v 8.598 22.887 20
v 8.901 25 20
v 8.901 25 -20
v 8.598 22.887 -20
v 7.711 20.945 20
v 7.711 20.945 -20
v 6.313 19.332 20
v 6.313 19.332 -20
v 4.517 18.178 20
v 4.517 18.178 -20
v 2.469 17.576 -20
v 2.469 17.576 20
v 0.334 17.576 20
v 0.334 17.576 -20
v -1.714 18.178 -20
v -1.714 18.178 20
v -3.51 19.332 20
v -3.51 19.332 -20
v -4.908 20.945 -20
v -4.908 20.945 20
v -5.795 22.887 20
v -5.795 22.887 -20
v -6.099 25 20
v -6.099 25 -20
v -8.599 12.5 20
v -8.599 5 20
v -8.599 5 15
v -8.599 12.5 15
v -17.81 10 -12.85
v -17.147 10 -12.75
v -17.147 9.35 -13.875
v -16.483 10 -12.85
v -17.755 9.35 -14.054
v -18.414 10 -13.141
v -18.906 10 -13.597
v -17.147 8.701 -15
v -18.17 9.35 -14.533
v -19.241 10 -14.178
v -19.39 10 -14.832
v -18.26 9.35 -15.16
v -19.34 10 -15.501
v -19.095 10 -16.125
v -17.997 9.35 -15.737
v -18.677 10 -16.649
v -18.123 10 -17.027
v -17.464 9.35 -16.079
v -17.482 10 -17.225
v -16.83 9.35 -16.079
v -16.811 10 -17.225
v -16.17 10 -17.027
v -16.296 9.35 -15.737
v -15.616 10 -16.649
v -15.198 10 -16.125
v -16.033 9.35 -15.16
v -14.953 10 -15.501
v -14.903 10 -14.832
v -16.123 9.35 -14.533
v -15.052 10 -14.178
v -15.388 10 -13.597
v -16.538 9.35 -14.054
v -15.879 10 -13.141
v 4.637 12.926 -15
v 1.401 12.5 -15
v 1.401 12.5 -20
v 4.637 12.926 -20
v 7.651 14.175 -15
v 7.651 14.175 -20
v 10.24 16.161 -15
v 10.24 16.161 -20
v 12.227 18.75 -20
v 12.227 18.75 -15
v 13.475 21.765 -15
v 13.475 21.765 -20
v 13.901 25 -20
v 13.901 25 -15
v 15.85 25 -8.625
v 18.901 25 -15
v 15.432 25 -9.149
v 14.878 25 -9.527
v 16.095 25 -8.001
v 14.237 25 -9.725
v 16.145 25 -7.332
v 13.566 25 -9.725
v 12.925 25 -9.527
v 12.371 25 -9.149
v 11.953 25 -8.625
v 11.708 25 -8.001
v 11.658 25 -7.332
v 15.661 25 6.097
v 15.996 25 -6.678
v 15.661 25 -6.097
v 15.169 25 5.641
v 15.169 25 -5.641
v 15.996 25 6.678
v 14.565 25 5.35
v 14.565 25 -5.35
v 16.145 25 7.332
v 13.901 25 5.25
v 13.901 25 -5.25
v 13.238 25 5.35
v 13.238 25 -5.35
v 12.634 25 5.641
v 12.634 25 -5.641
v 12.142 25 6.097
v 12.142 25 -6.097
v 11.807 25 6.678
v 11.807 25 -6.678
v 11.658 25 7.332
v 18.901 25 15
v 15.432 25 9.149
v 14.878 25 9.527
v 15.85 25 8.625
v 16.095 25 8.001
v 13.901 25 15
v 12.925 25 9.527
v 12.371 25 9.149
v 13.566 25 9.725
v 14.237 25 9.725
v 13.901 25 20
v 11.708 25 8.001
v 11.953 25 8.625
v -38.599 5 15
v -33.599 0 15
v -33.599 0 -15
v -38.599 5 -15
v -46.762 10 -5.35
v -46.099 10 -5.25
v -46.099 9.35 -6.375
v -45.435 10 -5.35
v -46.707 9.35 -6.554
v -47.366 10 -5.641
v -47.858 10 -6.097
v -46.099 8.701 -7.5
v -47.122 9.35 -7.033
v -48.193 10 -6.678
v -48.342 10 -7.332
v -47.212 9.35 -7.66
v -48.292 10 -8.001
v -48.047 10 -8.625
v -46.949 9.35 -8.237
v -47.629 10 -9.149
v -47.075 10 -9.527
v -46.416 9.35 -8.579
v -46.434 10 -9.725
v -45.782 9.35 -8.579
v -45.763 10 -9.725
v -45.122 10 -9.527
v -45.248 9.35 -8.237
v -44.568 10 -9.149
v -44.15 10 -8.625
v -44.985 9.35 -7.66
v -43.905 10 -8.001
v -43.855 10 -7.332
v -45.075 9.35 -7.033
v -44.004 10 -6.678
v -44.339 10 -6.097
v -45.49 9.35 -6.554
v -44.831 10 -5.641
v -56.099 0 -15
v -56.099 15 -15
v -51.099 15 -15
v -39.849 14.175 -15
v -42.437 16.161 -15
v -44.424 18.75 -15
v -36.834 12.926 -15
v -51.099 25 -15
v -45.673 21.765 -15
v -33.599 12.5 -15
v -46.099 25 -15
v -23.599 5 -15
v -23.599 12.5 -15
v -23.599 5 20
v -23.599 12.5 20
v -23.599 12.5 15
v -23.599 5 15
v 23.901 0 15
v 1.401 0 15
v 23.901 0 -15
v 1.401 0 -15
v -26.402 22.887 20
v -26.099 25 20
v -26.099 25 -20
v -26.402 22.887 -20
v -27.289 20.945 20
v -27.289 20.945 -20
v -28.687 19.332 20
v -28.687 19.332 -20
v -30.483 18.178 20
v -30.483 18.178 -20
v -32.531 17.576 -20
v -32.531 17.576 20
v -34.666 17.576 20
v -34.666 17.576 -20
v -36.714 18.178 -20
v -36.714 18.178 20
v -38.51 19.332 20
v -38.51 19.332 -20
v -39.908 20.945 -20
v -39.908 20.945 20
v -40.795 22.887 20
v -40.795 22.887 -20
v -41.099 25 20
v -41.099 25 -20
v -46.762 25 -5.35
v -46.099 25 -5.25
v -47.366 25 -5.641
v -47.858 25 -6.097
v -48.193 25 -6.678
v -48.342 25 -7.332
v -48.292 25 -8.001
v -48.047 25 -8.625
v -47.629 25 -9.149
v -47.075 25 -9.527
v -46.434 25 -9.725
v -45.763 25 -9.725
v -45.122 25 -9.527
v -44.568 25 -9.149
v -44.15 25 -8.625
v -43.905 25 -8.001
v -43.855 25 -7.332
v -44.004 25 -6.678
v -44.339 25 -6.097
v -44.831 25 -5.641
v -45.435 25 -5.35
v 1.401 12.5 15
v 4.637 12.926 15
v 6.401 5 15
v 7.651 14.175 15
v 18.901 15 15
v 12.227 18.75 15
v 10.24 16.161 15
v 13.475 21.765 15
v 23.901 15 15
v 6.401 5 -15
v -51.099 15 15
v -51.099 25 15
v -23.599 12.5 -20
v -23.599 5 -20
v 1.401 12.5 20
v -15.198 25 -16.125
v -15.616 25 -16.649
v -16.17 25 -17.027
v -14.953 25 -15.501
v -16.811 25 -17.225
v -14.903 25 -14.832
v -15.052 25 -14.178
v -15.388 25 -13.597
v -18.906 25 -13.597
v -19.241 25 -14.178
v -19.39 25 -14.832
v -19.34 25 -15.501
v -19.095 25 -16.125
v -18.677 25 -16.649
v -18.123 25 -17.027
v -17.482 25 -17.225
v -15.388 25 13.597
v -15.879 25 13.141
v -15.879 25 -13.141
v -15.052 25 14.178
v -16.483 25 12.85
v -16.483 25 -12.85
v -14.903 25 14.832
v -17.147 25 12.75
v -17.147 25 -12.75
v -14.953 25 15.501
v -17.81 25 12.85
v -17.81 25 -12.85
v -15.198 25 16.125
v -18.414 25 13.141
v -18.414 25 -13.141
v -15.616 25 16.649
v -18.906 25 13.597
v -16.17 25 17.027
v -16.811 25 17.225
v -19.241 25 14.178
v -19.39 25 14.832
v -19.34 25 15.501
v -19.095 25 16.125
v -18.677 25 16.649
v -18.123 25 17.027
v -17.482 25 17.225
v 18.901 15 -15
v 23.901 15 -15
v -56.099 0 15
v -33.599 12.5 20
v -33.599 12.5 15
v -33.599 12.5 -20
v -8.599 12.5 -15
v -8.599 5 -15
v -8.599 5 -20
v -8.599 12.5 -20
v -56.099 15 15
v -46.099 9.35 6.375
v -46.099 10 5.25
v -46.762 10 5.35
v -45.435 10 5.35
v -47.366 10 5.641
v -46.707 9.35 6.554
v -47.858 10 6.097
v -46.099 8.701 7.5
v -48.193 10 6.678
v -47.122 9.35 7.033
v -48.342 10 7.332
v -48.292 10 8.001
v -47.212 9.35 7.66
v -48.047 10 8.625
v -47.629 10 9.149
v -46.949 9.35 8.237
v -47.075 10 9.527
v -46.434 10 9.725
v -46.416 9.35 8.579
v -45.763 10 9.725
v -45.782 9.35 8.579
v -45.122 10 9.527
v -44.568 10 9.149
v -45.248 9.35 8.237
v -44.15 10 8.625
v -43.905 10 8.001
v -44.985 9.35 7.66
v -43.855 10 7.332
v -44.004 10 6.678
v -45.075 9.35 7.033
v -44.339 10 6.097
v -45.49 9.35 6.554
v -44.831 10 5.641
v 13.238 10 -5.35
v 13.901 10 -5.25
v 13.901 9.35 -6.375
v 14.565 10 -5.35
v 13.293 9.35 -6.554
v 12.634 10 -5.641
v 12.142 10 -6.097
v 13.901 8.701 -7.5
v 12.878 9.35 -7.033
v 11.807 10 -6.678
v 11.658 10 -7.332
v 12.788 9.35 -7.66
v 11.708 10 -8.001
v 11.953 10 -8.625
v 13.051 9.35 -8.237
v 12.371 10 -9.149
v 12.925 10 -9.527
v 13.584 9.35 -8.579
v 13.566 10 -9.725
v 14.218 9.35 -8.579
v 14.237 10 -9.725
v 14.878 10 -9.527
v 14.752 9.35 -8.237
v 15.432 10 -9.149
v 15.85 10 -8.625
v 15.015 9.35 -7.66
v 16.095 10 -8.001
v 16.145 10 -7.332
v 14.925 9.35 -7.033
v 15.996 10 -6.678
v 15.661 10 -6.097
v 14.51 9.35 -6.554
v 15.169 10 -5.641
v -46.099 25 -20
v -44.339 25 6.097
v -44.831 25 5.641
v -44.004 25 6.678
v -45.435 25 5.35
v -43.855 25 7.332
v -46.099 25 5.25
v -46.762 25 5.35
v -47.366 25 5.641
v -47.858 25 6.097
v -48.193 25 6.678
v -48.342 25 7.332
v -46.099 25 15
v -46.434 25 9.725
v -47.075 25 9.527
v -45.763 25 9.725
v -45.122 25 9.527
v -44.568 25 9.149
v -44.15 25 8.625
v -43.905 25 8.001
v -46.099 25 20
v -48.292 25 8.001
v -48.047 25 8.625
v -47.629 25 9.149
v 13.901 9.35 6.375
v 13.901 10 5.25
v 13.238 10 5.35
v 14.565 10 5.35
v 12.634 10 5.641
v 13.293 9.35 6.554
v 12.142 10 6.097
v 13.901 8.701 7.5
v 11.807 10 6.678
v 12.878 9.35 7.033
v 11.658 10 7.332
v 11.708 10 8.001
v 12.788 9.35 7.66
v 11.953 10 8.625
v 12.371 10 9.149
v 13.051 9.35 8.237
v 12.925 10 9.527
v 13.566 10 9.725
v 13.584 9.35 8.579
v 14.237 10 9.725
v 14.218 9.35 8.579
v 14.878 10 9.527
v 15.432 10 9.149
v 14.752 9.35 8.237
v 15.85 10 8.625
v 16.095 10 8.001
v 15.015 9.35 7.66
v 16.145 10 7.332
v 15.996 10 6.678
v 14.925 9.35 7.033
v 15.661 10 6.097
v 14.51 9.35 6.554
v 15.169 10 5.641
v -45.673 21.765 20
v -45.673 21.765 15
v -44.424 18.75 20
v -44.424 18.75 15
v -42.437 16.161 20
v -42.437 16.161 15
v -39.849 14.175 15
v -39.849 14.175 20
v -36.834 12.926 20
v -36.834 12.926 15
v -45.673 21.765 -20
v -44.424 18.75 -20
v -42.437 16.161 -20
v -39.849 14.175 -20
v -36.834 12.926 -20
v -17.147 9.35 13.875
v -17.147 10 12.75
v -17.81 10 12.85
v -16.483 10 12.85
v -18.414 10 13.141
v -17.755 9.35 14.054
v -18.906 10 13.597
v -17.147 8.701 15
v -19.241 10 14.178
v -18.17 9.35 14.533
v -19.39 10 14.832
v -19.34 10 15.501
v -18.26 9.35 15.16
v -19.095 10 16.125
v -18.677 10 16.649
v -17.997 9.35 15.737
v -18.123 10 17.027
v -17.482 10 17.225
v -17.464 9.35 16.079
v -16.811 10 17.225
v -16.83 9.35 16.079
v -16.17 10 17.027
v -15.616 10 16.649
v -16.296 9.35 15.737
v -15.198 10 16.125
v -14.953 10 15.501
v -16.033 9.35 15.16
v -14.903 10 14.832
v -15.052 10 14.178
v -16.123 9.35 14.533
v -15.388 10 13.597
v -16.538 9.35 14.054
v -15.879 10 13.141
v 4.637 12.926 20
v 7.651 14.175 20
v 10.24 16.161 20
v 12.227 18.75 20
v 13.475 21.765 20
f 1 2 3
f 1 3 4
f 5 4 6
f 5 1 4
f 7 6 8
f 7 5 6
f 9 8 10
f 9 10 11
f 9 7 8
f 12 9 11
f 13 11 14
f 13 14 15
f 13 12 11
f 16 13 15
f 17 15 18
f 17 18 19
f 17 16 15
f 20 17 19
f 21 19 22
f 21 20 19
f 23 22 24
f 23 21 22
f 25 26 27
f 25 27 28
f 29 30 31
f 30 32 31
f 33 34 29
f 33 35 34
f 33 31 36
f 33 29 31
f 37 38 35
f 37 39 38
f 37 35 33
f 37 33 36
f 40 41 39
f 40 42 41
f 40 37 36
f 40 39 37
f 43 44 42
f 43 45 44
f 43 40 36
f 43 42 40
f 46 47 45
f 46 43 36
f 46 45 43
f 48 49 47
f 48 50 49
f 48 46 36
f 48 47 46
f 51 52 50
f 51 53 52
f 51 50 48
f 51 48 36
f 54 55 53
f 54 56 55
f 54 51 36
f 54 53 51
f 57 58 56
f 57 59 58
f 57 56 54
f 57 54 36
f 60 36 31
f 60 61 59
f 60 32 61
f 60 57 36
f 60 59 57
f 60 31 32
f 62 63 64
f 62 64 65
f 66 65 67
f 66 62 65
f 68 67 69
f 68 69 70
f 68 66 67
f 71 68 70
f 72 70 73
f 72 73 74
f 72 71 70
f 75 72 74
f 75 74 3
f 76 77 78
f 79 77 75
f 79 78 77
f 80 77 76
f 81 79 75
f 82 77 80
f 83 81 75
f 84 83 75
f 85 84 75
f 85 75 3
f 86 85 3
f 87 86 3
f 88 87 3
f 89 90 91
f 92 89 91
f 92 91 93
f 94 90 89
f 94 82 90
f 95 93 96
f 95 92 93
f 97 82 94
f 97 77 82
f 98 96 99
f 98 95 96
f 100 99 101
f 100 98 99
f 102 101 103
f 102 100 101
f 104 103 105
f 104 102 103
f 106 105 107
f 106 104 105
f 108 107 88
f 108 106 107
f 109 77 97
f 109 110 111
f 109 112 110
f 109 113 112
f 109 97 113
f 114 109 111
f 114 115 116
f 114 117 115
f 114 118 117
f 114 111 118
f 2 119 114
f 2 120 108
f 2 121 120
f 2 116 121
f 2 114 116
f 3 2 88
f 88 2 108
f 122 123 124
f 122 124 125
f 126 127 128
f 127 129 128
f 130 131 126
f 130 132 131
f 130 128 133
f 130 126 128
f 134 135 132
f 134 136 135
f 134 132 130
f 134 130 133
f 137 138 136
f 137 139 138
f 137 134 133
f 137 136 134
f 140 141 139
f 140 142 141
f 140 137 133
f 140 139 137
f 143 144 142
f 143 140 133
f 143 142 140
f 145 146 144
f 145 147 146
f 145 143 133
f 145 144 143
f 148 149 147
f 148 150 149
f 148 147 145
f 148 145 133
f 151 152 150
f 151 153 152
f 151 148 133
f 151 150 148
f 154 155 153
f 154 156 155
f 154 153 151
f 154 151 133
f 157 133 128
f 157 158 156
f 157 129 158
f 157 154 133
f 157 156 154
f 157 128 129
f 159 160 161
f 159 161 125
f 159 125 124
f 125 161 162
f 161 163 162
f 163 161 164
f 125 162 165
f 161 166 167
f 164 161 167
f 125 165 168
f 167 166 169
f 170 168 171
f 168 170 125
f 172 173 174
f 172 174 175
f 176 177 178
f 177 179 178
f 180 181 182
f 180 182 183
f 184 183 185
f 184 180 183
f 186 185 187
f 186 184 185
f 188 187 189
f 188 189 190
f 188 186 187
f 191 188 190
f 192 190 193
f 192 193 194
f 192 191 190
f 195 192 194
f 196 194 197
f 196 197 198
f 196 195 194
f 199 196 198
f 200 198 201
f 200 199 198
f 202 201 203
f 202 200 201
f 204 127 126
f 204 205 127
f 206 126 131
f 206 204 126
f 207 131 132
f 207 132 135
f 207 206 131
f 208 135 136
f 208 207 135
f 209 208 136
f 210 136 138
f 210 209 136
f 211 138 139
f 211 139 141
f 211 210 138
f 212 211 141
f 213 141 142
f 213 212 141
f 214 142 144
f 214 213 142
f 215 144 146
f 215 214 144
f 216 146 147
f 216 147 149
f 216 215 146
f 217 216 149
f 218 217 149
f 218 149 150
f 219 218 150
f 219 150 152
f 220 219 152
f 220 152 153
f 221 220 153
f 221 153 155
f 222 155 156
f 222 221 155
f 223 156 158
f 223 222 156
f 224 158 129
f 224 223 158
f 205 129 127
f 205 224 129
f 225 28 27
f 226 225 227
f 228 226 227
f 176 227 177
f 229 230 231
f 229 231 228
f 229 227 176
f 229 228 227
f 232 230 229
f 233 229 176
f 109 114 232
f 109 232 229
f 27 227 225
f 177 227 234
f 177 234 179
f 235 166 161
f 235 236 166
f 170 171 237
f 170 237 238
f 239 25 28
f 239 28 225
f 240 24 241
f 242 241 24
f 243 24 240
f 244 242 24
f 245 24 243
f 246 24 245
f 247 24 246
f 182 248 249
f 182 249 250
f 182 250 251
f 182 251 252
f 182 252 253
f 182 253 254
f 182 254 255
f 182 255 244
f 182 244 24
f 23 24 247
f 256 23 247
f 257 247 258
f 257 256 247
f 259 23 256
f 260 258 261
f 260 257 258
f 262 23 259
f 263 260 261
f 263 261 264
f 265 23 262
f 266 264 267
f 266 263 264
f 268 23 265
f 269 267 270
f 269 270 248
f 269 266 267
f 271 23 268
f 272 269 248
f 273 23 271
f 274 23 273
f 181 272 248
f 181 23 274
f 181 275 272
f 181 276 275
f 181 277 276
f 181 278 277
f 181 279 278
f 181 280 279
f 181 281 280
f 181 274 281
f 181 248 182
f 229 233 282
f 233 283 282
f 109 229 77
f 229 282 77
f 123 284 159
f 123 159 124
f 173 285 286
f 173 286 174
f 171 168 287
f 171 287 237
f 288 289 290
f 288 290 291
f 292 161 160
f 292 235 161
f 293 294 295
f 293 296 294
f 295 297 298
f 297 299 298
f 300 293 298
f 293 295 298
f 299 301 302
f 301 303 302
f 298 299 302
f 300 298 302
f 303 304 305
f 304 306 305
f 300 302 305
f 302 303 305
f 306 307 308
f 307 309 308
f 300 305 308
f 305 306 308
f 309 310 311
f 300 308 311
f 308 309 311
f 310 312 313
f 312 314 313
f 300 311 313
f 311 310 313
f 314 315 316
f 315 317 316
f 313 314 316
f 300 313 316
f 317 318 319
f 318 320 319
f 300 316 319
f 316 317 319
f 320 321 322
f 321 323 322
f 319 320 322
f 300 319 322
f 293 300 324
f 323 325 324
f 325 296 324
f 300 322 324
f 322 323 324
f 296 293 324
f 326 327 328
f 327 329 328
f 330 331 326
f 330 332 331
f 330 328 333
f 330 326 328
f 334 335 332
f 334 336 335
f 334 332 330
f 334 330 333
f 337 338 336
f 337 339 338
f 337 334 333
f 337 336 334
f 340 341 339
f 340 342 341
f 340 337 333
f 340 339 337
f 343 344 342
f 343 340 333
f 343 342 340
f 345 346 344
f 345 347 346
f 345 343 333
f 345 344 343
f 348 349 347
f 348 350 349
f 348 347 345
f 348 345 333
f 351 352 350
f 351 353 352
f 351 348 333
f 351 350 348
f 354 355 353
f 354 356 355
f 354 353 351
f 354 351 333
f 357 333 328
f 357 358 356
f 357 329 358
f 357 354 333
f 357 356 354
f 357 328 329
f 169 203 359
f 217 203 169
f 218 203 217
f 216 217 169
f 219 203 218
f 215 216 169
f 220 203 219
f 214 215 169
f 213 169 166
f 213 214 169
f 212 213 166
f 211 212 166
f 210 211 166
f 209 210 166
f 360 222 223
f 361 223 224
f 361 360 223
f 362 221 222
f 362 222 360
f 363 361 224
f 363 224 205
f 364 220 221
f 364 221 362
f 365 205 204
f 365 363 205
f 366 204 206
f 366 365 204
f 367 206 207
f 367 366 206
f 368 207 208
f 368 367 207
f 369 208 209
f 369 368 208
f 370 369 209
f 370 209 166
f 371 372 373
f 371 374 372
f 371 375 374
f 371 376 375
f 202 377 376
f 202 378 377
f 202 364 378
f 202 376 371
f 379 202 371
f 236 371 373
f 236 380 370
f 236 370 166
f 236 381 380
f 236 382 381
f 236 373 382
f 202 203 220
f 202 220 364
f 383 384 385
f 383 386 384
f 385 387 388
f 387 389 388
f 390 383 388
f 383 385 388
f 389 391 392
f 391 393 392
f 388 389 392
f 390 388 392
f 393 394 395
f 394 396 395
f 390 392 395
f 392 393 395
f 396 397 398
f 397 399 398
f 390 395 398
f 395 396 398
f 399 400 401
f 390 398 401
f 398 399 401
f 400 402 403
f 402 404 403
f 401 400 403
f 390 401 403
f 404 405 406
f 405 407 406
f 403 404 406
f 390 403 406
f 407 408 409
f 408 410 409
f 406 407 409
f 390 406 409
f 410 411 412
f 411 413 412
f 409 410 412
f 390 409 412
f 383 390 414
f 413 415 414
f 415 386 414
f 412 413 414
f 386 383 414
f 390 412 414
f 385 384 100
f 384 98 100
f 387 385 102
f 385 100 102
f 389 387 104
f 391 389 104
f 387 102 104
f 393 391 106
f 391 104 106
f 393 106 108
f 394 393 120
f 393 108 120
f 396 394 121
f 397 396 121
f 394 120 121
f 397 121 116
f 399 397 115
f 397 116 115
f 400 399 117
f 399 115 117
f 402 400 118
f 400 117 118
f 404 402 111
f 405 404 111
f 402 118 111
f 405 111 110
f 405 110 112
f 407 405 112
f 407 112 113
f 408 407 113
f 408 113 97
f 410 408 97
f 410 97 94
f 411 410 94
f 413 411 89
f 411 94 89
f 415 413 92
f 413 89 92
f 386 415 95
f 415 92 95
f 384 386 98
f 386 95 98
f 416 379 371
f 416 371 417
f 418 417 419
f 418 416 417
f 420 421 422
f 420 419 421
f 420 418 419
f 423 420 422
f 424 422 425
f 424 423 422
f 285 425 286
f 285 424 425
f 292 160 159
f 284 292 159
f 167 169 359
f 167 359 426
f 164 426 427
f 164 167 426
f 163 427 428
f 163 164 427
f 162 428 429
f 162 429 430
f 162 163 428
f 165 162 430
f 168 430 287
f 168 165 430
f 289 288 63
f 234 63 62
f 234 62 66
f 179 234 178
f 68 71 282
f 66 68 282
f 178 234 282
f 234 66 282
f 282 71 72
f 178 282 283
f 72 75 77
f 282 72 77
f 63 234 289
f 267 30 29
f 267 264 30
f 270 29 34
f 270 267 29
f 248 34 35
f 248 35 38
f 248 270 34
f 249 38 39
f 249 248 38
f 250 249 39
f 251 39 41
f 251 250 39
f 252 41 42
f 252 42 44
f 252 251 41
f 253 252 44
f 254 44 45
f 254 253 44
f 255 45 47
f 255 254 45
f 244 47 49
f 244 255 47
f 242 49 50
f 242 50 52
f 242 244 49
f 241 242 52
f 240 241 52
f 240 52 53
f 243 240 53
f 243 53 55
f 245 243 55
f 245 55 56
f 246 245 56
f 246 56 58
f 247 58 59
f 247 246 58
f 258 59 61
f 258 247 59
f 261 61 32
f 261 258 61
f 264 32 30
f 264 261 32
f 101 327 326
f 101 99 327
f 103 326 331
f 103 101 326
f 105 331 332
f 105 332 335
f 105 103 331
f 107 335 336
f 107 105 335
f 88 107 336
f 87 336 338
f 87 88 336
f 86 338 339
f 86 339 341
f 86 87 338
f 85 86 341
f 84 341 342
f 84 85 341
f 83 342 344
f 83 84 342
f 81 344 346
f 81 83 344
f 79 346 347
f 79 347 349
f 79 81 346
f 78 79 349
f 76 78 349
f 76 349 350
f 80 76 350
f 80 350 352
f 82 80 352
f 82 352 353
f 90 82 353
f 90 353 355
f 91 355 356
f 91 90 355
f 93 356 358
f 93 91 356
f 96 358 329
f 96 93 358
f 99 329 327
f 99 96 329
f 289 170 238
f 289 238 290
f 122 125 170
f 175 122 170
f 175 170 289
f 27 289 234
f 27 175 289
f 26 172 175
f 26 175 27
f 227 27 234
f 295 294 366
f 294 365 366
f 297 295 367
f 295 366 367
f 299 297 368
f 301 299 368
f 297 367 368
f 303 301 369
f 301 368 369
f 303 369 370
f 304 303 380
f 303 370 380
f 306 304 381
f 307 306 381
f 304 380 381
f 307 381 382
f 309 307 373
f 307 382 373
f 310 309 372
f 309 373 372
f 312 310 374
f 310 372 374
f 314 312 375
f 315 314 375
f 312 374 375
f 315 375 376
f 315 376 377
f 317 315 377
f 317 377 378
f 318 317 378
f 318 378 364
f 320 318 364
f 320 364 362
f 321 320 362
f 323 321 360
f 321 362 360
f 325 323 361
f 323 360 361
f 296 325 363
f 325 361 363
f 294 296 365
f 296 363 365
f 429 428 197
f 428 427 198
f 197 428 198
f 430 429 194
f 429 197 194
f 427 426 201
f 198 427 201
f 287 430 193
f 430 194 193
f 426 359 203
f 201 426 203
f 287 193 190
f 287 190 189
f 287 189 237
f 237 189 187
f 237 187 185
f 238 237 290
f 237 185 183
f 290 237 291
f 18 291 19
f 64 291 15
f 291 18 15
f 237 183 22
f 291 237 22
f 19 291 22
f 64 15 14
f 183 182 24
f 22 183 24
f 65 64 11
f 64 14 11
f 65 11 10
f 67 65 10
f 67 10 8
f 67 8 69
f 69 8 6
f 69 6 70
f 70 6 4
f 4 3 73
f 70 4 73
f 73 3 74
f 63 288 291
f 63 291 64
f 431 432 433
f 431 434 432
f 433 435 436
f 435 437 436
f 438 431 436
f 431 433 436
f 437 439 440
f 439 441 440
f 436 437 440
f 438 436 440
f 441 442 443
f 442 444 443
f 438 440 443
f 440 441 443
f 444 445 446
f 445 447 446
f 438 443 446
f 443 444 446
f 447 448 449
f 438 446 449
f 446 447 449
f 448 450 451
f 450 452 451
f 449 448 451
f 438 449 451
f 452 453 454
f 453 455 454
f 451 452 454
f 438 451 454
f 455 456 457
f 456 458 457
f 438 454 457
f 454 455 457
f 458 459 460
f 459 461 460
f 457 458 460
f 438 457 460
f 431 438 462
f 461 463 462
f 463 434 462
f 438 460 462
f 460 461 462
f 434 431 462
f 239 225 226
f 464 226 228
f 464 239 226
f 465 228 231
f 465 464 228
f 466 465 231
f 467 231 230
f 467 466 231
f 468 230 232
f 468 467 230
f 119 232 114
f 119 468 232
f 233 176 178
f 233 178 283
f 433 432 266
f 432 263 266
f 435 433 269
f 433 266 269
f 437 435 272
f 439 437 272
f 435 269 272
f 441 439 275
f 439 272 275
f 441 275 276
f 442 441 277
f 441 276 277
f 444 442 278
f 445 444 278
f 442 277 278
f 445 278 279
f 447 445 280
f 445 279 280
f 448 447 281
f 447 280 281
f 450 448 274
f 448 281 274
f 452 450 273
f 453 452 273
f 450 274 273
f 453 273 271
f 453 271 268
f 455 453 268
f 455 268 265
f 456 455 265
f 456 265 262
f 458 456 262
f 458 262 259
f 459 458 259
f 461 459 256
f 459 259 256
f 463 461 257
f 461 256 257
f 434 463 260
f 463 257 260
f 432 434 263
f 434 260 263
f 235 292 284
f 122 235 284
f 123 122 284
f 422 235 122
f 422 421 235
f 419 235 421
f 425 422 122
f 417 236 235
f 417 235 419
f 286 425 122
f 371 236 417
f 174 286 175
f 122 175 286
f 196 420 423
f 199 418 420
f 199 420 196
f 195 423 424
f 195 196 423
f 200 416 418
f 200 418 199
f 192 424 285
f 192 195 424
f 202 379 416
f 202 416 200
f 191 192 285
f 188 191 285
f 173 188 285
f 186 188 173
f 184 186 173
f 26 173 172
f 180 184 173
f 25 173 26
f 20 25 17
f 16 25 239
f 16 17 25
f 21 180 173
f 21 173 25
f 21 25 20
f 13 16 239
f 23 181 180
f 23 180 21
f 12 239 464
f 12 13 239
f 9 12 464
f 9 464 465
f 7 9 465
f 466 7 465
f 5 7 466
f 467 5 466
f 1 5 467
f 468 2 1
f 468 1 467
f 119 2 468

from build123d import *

# Parameters (mm, degrees)
BOSS_EXTRUDE1_DEPTH            = 20
BOSS_EXTRUDE2_DEPTH            = 15
F_1_0MM_DOWEL_HOLE1_AT_2_COUNT = 2
F_1_0MM_DOWEL_HOLE1_AT_2_PITCH = 31.941060089
F_1_0MM_DOWEL_HOLE1_AT_3_COUNT = 2
F_1_0MM_DOWEL_HOLE1_AT_3_PITCH = 29.907615952


with BuildPart() as part:
    # Sketch1 → Boss-Extrude1 (new, symmetric)
    with BuildSketch(Plane.XY):
        with BuildLine():
            Line((-23.598593643, 12.5), (-23.598593643, 5))
            Line((-23.598593643, 5), (-8.598593643, 5))
            Line((-8.598593643, 5), (-8.598593643, 12.5))
            Line((-8.598593643, 12.5), (1.401406357, 12.5))
            ThreePointArc((1.401406357, 12.5), (10.240241122, 16.161165235), (13.901406357, 25))
            Line((13.901406357, 25), (8.901406357, 25))
            ThreePointArc((8.901406357, 25), (1.401406357, 17.5), (-6.098593643, 25))
            Line((-6.098593643, 25), (-26.098593643, 25))
            ThreePointArc((-26.098593643, 25), (-33.598593643, 17.5), (-41.098593643, 25))
            Line((-41.098593643, 25), (-46.098593643, 25))
            ThreePointArc((-46.098593643, 25), (-42.437428408, 16.161165235), (-33.598593643, 12.5))
            Line((-33.598593643, 12.5), (-23.598593643, 12.5))
        make_face()
    extrude(amount=BOSS_EXTRUDE1_DEPTH, both=True)

    # Sketch1<3> → Boss-Extrude2 (add, symmetric)
    with BuildSketch(Plane.XY):
        with BuildLine():
            Line((-8.598593643, 12.5), (-8.598593643, 5))
            Line((-8.598593643, 5), (6.401406357, 5))
            Line((6.401406357, 5), (1.401406357, 0))
            Line((1.401406357, 0), (23.901406357, 0))
            Line((23.901406357, 0), (23.901406357, 15))
            Line((23.901406357, 15), (18.901406357, 15))
            Line((18.901406357, 15), (18.901406357, 25))
            Line((18.901406357, 25), (13.901406357, 25))
            ThreePointArc((13.901406357, 25), (10.240241122, 16.161165235), (1.401406357, 12.5))
            Line((1.401406357, 12.5), (-8.598593643, 12.5))
        make_face()
        with BuildLine():
            Line((-56.098593643, 15), (-56.098593643, 0))
            Line((-56.098593643, 0), (-33.598593643, 0))
            Line((-33.598593643, 0), (-38.598593643, 5))
            Line((-38.598593643, 5), (-23.598593643, 5))
            Line((-23.598593643, 5), (-23.598593643, 12.5))
            Line((-23.598593643, 12.5), (-33.598593643, 12.5))
            ThreePointArc((-33.598593643, 12.5), (-42.437428408, 16.161165235), (-46.098593643, 25))
            Line((-46.098593643, 25), (-51.098593643, 25))
            Line((-51.098593643, 25), (-51.098593643, 15))
            Line((-51.098593643, 15), (-56.098593643, 15))
        make_face()
    extrude(amount=BOSS_EXTRUDE2_DEPTH, both=True)

    # Sketch4 → Ø1.0mm Dowel Hole1 (revolve, cut)
    with BuildSketch(Plane(origin=(-17.146642207, 25, -15), x_dir=(0, 0, 1), z_dir=(1, 0, 0))):
        Polygon((0, 0), (0, 16.299038106), (2.25, 15), (2.25, 0), align=None)
    f_1_0mm_dowel_hole1 = revolve(axis=Axis((-17.146642207, 31.35, -15), (0, -1, 0)), mode=Mode.SUBTRACT)

    # Ø1.0mm Dowel Hole1 at 2: Ø1.0mm Dowel Hole1 ×2
    with Locations(*[Vector(0.9720418945746677, 0, 0.23480748538258048) * (i * F_1_0MM_DOWEL_HOLE1_AT_2_PITCH) for i in range(1, F_1_0MM_DOWEL_HOLE1_AT_2_COUNT)]):
        add(f_1_0mm_dowel_hole1, mode=Mode.SUBTRACT)

    # Ø1.0mm Dowel Hole1 at 3: Ø1.0mm Dowel Hole1 ×2
    with Locations(*[Vector(-0.9680461151483998, 0, 0.25077224516698626) * (i * F_1_0MM_DOWEL_HOLE1_AT_3_PITCH) for i in range(1, F_1_0MM_DOWEL_HOLE1_AT_3_COUNT)]):
        add(f_1_0mm_dowel_hole1, mode=Mode.SUBTRACT)

    # Mirror1: Ø1.0mm Dowel Hole1 across plane
    add(f_1_0mm_dowel_hole1.mirror(Plane.XY), mode=Mode.SUBTRACT)

    # Mirror1 copy 1 sketch → Mirror1 copy 1 (revolve, cut)
    with BuildSketch(Plane(origin=(13.901406357, 25, 7.5), x_dir=(0, 0, -1), z_dir=(1, 0, 0))):
        Polygon((0, 0), (0, -16.299038106), (2.25, -15), (2.25, 0), align=None)
    revolve(axis=Axis((13.901406357, 31.35, 7.5), (0, 1, 0)), mode=Mode.SUBTRACT)

    # Mirror1 copy 2 sketch → Mirror1 copy 2 (revolve, cut)
    with BuildSketch(Plane(origin=(-46.098593643, 25, 7.5), x_dir=(0, 0, -1), z_dir=(1, 0, 0))):
        Polygon((0, 0), (0, -16.299038106), (2.25, -15), (2.25, 0), align=None)
    revolve(axis=Axis((-46.098593643, 31.35, 7.5), (0, 1, 0)), mode=Mode.SUBTRACT)


solid = part.part
